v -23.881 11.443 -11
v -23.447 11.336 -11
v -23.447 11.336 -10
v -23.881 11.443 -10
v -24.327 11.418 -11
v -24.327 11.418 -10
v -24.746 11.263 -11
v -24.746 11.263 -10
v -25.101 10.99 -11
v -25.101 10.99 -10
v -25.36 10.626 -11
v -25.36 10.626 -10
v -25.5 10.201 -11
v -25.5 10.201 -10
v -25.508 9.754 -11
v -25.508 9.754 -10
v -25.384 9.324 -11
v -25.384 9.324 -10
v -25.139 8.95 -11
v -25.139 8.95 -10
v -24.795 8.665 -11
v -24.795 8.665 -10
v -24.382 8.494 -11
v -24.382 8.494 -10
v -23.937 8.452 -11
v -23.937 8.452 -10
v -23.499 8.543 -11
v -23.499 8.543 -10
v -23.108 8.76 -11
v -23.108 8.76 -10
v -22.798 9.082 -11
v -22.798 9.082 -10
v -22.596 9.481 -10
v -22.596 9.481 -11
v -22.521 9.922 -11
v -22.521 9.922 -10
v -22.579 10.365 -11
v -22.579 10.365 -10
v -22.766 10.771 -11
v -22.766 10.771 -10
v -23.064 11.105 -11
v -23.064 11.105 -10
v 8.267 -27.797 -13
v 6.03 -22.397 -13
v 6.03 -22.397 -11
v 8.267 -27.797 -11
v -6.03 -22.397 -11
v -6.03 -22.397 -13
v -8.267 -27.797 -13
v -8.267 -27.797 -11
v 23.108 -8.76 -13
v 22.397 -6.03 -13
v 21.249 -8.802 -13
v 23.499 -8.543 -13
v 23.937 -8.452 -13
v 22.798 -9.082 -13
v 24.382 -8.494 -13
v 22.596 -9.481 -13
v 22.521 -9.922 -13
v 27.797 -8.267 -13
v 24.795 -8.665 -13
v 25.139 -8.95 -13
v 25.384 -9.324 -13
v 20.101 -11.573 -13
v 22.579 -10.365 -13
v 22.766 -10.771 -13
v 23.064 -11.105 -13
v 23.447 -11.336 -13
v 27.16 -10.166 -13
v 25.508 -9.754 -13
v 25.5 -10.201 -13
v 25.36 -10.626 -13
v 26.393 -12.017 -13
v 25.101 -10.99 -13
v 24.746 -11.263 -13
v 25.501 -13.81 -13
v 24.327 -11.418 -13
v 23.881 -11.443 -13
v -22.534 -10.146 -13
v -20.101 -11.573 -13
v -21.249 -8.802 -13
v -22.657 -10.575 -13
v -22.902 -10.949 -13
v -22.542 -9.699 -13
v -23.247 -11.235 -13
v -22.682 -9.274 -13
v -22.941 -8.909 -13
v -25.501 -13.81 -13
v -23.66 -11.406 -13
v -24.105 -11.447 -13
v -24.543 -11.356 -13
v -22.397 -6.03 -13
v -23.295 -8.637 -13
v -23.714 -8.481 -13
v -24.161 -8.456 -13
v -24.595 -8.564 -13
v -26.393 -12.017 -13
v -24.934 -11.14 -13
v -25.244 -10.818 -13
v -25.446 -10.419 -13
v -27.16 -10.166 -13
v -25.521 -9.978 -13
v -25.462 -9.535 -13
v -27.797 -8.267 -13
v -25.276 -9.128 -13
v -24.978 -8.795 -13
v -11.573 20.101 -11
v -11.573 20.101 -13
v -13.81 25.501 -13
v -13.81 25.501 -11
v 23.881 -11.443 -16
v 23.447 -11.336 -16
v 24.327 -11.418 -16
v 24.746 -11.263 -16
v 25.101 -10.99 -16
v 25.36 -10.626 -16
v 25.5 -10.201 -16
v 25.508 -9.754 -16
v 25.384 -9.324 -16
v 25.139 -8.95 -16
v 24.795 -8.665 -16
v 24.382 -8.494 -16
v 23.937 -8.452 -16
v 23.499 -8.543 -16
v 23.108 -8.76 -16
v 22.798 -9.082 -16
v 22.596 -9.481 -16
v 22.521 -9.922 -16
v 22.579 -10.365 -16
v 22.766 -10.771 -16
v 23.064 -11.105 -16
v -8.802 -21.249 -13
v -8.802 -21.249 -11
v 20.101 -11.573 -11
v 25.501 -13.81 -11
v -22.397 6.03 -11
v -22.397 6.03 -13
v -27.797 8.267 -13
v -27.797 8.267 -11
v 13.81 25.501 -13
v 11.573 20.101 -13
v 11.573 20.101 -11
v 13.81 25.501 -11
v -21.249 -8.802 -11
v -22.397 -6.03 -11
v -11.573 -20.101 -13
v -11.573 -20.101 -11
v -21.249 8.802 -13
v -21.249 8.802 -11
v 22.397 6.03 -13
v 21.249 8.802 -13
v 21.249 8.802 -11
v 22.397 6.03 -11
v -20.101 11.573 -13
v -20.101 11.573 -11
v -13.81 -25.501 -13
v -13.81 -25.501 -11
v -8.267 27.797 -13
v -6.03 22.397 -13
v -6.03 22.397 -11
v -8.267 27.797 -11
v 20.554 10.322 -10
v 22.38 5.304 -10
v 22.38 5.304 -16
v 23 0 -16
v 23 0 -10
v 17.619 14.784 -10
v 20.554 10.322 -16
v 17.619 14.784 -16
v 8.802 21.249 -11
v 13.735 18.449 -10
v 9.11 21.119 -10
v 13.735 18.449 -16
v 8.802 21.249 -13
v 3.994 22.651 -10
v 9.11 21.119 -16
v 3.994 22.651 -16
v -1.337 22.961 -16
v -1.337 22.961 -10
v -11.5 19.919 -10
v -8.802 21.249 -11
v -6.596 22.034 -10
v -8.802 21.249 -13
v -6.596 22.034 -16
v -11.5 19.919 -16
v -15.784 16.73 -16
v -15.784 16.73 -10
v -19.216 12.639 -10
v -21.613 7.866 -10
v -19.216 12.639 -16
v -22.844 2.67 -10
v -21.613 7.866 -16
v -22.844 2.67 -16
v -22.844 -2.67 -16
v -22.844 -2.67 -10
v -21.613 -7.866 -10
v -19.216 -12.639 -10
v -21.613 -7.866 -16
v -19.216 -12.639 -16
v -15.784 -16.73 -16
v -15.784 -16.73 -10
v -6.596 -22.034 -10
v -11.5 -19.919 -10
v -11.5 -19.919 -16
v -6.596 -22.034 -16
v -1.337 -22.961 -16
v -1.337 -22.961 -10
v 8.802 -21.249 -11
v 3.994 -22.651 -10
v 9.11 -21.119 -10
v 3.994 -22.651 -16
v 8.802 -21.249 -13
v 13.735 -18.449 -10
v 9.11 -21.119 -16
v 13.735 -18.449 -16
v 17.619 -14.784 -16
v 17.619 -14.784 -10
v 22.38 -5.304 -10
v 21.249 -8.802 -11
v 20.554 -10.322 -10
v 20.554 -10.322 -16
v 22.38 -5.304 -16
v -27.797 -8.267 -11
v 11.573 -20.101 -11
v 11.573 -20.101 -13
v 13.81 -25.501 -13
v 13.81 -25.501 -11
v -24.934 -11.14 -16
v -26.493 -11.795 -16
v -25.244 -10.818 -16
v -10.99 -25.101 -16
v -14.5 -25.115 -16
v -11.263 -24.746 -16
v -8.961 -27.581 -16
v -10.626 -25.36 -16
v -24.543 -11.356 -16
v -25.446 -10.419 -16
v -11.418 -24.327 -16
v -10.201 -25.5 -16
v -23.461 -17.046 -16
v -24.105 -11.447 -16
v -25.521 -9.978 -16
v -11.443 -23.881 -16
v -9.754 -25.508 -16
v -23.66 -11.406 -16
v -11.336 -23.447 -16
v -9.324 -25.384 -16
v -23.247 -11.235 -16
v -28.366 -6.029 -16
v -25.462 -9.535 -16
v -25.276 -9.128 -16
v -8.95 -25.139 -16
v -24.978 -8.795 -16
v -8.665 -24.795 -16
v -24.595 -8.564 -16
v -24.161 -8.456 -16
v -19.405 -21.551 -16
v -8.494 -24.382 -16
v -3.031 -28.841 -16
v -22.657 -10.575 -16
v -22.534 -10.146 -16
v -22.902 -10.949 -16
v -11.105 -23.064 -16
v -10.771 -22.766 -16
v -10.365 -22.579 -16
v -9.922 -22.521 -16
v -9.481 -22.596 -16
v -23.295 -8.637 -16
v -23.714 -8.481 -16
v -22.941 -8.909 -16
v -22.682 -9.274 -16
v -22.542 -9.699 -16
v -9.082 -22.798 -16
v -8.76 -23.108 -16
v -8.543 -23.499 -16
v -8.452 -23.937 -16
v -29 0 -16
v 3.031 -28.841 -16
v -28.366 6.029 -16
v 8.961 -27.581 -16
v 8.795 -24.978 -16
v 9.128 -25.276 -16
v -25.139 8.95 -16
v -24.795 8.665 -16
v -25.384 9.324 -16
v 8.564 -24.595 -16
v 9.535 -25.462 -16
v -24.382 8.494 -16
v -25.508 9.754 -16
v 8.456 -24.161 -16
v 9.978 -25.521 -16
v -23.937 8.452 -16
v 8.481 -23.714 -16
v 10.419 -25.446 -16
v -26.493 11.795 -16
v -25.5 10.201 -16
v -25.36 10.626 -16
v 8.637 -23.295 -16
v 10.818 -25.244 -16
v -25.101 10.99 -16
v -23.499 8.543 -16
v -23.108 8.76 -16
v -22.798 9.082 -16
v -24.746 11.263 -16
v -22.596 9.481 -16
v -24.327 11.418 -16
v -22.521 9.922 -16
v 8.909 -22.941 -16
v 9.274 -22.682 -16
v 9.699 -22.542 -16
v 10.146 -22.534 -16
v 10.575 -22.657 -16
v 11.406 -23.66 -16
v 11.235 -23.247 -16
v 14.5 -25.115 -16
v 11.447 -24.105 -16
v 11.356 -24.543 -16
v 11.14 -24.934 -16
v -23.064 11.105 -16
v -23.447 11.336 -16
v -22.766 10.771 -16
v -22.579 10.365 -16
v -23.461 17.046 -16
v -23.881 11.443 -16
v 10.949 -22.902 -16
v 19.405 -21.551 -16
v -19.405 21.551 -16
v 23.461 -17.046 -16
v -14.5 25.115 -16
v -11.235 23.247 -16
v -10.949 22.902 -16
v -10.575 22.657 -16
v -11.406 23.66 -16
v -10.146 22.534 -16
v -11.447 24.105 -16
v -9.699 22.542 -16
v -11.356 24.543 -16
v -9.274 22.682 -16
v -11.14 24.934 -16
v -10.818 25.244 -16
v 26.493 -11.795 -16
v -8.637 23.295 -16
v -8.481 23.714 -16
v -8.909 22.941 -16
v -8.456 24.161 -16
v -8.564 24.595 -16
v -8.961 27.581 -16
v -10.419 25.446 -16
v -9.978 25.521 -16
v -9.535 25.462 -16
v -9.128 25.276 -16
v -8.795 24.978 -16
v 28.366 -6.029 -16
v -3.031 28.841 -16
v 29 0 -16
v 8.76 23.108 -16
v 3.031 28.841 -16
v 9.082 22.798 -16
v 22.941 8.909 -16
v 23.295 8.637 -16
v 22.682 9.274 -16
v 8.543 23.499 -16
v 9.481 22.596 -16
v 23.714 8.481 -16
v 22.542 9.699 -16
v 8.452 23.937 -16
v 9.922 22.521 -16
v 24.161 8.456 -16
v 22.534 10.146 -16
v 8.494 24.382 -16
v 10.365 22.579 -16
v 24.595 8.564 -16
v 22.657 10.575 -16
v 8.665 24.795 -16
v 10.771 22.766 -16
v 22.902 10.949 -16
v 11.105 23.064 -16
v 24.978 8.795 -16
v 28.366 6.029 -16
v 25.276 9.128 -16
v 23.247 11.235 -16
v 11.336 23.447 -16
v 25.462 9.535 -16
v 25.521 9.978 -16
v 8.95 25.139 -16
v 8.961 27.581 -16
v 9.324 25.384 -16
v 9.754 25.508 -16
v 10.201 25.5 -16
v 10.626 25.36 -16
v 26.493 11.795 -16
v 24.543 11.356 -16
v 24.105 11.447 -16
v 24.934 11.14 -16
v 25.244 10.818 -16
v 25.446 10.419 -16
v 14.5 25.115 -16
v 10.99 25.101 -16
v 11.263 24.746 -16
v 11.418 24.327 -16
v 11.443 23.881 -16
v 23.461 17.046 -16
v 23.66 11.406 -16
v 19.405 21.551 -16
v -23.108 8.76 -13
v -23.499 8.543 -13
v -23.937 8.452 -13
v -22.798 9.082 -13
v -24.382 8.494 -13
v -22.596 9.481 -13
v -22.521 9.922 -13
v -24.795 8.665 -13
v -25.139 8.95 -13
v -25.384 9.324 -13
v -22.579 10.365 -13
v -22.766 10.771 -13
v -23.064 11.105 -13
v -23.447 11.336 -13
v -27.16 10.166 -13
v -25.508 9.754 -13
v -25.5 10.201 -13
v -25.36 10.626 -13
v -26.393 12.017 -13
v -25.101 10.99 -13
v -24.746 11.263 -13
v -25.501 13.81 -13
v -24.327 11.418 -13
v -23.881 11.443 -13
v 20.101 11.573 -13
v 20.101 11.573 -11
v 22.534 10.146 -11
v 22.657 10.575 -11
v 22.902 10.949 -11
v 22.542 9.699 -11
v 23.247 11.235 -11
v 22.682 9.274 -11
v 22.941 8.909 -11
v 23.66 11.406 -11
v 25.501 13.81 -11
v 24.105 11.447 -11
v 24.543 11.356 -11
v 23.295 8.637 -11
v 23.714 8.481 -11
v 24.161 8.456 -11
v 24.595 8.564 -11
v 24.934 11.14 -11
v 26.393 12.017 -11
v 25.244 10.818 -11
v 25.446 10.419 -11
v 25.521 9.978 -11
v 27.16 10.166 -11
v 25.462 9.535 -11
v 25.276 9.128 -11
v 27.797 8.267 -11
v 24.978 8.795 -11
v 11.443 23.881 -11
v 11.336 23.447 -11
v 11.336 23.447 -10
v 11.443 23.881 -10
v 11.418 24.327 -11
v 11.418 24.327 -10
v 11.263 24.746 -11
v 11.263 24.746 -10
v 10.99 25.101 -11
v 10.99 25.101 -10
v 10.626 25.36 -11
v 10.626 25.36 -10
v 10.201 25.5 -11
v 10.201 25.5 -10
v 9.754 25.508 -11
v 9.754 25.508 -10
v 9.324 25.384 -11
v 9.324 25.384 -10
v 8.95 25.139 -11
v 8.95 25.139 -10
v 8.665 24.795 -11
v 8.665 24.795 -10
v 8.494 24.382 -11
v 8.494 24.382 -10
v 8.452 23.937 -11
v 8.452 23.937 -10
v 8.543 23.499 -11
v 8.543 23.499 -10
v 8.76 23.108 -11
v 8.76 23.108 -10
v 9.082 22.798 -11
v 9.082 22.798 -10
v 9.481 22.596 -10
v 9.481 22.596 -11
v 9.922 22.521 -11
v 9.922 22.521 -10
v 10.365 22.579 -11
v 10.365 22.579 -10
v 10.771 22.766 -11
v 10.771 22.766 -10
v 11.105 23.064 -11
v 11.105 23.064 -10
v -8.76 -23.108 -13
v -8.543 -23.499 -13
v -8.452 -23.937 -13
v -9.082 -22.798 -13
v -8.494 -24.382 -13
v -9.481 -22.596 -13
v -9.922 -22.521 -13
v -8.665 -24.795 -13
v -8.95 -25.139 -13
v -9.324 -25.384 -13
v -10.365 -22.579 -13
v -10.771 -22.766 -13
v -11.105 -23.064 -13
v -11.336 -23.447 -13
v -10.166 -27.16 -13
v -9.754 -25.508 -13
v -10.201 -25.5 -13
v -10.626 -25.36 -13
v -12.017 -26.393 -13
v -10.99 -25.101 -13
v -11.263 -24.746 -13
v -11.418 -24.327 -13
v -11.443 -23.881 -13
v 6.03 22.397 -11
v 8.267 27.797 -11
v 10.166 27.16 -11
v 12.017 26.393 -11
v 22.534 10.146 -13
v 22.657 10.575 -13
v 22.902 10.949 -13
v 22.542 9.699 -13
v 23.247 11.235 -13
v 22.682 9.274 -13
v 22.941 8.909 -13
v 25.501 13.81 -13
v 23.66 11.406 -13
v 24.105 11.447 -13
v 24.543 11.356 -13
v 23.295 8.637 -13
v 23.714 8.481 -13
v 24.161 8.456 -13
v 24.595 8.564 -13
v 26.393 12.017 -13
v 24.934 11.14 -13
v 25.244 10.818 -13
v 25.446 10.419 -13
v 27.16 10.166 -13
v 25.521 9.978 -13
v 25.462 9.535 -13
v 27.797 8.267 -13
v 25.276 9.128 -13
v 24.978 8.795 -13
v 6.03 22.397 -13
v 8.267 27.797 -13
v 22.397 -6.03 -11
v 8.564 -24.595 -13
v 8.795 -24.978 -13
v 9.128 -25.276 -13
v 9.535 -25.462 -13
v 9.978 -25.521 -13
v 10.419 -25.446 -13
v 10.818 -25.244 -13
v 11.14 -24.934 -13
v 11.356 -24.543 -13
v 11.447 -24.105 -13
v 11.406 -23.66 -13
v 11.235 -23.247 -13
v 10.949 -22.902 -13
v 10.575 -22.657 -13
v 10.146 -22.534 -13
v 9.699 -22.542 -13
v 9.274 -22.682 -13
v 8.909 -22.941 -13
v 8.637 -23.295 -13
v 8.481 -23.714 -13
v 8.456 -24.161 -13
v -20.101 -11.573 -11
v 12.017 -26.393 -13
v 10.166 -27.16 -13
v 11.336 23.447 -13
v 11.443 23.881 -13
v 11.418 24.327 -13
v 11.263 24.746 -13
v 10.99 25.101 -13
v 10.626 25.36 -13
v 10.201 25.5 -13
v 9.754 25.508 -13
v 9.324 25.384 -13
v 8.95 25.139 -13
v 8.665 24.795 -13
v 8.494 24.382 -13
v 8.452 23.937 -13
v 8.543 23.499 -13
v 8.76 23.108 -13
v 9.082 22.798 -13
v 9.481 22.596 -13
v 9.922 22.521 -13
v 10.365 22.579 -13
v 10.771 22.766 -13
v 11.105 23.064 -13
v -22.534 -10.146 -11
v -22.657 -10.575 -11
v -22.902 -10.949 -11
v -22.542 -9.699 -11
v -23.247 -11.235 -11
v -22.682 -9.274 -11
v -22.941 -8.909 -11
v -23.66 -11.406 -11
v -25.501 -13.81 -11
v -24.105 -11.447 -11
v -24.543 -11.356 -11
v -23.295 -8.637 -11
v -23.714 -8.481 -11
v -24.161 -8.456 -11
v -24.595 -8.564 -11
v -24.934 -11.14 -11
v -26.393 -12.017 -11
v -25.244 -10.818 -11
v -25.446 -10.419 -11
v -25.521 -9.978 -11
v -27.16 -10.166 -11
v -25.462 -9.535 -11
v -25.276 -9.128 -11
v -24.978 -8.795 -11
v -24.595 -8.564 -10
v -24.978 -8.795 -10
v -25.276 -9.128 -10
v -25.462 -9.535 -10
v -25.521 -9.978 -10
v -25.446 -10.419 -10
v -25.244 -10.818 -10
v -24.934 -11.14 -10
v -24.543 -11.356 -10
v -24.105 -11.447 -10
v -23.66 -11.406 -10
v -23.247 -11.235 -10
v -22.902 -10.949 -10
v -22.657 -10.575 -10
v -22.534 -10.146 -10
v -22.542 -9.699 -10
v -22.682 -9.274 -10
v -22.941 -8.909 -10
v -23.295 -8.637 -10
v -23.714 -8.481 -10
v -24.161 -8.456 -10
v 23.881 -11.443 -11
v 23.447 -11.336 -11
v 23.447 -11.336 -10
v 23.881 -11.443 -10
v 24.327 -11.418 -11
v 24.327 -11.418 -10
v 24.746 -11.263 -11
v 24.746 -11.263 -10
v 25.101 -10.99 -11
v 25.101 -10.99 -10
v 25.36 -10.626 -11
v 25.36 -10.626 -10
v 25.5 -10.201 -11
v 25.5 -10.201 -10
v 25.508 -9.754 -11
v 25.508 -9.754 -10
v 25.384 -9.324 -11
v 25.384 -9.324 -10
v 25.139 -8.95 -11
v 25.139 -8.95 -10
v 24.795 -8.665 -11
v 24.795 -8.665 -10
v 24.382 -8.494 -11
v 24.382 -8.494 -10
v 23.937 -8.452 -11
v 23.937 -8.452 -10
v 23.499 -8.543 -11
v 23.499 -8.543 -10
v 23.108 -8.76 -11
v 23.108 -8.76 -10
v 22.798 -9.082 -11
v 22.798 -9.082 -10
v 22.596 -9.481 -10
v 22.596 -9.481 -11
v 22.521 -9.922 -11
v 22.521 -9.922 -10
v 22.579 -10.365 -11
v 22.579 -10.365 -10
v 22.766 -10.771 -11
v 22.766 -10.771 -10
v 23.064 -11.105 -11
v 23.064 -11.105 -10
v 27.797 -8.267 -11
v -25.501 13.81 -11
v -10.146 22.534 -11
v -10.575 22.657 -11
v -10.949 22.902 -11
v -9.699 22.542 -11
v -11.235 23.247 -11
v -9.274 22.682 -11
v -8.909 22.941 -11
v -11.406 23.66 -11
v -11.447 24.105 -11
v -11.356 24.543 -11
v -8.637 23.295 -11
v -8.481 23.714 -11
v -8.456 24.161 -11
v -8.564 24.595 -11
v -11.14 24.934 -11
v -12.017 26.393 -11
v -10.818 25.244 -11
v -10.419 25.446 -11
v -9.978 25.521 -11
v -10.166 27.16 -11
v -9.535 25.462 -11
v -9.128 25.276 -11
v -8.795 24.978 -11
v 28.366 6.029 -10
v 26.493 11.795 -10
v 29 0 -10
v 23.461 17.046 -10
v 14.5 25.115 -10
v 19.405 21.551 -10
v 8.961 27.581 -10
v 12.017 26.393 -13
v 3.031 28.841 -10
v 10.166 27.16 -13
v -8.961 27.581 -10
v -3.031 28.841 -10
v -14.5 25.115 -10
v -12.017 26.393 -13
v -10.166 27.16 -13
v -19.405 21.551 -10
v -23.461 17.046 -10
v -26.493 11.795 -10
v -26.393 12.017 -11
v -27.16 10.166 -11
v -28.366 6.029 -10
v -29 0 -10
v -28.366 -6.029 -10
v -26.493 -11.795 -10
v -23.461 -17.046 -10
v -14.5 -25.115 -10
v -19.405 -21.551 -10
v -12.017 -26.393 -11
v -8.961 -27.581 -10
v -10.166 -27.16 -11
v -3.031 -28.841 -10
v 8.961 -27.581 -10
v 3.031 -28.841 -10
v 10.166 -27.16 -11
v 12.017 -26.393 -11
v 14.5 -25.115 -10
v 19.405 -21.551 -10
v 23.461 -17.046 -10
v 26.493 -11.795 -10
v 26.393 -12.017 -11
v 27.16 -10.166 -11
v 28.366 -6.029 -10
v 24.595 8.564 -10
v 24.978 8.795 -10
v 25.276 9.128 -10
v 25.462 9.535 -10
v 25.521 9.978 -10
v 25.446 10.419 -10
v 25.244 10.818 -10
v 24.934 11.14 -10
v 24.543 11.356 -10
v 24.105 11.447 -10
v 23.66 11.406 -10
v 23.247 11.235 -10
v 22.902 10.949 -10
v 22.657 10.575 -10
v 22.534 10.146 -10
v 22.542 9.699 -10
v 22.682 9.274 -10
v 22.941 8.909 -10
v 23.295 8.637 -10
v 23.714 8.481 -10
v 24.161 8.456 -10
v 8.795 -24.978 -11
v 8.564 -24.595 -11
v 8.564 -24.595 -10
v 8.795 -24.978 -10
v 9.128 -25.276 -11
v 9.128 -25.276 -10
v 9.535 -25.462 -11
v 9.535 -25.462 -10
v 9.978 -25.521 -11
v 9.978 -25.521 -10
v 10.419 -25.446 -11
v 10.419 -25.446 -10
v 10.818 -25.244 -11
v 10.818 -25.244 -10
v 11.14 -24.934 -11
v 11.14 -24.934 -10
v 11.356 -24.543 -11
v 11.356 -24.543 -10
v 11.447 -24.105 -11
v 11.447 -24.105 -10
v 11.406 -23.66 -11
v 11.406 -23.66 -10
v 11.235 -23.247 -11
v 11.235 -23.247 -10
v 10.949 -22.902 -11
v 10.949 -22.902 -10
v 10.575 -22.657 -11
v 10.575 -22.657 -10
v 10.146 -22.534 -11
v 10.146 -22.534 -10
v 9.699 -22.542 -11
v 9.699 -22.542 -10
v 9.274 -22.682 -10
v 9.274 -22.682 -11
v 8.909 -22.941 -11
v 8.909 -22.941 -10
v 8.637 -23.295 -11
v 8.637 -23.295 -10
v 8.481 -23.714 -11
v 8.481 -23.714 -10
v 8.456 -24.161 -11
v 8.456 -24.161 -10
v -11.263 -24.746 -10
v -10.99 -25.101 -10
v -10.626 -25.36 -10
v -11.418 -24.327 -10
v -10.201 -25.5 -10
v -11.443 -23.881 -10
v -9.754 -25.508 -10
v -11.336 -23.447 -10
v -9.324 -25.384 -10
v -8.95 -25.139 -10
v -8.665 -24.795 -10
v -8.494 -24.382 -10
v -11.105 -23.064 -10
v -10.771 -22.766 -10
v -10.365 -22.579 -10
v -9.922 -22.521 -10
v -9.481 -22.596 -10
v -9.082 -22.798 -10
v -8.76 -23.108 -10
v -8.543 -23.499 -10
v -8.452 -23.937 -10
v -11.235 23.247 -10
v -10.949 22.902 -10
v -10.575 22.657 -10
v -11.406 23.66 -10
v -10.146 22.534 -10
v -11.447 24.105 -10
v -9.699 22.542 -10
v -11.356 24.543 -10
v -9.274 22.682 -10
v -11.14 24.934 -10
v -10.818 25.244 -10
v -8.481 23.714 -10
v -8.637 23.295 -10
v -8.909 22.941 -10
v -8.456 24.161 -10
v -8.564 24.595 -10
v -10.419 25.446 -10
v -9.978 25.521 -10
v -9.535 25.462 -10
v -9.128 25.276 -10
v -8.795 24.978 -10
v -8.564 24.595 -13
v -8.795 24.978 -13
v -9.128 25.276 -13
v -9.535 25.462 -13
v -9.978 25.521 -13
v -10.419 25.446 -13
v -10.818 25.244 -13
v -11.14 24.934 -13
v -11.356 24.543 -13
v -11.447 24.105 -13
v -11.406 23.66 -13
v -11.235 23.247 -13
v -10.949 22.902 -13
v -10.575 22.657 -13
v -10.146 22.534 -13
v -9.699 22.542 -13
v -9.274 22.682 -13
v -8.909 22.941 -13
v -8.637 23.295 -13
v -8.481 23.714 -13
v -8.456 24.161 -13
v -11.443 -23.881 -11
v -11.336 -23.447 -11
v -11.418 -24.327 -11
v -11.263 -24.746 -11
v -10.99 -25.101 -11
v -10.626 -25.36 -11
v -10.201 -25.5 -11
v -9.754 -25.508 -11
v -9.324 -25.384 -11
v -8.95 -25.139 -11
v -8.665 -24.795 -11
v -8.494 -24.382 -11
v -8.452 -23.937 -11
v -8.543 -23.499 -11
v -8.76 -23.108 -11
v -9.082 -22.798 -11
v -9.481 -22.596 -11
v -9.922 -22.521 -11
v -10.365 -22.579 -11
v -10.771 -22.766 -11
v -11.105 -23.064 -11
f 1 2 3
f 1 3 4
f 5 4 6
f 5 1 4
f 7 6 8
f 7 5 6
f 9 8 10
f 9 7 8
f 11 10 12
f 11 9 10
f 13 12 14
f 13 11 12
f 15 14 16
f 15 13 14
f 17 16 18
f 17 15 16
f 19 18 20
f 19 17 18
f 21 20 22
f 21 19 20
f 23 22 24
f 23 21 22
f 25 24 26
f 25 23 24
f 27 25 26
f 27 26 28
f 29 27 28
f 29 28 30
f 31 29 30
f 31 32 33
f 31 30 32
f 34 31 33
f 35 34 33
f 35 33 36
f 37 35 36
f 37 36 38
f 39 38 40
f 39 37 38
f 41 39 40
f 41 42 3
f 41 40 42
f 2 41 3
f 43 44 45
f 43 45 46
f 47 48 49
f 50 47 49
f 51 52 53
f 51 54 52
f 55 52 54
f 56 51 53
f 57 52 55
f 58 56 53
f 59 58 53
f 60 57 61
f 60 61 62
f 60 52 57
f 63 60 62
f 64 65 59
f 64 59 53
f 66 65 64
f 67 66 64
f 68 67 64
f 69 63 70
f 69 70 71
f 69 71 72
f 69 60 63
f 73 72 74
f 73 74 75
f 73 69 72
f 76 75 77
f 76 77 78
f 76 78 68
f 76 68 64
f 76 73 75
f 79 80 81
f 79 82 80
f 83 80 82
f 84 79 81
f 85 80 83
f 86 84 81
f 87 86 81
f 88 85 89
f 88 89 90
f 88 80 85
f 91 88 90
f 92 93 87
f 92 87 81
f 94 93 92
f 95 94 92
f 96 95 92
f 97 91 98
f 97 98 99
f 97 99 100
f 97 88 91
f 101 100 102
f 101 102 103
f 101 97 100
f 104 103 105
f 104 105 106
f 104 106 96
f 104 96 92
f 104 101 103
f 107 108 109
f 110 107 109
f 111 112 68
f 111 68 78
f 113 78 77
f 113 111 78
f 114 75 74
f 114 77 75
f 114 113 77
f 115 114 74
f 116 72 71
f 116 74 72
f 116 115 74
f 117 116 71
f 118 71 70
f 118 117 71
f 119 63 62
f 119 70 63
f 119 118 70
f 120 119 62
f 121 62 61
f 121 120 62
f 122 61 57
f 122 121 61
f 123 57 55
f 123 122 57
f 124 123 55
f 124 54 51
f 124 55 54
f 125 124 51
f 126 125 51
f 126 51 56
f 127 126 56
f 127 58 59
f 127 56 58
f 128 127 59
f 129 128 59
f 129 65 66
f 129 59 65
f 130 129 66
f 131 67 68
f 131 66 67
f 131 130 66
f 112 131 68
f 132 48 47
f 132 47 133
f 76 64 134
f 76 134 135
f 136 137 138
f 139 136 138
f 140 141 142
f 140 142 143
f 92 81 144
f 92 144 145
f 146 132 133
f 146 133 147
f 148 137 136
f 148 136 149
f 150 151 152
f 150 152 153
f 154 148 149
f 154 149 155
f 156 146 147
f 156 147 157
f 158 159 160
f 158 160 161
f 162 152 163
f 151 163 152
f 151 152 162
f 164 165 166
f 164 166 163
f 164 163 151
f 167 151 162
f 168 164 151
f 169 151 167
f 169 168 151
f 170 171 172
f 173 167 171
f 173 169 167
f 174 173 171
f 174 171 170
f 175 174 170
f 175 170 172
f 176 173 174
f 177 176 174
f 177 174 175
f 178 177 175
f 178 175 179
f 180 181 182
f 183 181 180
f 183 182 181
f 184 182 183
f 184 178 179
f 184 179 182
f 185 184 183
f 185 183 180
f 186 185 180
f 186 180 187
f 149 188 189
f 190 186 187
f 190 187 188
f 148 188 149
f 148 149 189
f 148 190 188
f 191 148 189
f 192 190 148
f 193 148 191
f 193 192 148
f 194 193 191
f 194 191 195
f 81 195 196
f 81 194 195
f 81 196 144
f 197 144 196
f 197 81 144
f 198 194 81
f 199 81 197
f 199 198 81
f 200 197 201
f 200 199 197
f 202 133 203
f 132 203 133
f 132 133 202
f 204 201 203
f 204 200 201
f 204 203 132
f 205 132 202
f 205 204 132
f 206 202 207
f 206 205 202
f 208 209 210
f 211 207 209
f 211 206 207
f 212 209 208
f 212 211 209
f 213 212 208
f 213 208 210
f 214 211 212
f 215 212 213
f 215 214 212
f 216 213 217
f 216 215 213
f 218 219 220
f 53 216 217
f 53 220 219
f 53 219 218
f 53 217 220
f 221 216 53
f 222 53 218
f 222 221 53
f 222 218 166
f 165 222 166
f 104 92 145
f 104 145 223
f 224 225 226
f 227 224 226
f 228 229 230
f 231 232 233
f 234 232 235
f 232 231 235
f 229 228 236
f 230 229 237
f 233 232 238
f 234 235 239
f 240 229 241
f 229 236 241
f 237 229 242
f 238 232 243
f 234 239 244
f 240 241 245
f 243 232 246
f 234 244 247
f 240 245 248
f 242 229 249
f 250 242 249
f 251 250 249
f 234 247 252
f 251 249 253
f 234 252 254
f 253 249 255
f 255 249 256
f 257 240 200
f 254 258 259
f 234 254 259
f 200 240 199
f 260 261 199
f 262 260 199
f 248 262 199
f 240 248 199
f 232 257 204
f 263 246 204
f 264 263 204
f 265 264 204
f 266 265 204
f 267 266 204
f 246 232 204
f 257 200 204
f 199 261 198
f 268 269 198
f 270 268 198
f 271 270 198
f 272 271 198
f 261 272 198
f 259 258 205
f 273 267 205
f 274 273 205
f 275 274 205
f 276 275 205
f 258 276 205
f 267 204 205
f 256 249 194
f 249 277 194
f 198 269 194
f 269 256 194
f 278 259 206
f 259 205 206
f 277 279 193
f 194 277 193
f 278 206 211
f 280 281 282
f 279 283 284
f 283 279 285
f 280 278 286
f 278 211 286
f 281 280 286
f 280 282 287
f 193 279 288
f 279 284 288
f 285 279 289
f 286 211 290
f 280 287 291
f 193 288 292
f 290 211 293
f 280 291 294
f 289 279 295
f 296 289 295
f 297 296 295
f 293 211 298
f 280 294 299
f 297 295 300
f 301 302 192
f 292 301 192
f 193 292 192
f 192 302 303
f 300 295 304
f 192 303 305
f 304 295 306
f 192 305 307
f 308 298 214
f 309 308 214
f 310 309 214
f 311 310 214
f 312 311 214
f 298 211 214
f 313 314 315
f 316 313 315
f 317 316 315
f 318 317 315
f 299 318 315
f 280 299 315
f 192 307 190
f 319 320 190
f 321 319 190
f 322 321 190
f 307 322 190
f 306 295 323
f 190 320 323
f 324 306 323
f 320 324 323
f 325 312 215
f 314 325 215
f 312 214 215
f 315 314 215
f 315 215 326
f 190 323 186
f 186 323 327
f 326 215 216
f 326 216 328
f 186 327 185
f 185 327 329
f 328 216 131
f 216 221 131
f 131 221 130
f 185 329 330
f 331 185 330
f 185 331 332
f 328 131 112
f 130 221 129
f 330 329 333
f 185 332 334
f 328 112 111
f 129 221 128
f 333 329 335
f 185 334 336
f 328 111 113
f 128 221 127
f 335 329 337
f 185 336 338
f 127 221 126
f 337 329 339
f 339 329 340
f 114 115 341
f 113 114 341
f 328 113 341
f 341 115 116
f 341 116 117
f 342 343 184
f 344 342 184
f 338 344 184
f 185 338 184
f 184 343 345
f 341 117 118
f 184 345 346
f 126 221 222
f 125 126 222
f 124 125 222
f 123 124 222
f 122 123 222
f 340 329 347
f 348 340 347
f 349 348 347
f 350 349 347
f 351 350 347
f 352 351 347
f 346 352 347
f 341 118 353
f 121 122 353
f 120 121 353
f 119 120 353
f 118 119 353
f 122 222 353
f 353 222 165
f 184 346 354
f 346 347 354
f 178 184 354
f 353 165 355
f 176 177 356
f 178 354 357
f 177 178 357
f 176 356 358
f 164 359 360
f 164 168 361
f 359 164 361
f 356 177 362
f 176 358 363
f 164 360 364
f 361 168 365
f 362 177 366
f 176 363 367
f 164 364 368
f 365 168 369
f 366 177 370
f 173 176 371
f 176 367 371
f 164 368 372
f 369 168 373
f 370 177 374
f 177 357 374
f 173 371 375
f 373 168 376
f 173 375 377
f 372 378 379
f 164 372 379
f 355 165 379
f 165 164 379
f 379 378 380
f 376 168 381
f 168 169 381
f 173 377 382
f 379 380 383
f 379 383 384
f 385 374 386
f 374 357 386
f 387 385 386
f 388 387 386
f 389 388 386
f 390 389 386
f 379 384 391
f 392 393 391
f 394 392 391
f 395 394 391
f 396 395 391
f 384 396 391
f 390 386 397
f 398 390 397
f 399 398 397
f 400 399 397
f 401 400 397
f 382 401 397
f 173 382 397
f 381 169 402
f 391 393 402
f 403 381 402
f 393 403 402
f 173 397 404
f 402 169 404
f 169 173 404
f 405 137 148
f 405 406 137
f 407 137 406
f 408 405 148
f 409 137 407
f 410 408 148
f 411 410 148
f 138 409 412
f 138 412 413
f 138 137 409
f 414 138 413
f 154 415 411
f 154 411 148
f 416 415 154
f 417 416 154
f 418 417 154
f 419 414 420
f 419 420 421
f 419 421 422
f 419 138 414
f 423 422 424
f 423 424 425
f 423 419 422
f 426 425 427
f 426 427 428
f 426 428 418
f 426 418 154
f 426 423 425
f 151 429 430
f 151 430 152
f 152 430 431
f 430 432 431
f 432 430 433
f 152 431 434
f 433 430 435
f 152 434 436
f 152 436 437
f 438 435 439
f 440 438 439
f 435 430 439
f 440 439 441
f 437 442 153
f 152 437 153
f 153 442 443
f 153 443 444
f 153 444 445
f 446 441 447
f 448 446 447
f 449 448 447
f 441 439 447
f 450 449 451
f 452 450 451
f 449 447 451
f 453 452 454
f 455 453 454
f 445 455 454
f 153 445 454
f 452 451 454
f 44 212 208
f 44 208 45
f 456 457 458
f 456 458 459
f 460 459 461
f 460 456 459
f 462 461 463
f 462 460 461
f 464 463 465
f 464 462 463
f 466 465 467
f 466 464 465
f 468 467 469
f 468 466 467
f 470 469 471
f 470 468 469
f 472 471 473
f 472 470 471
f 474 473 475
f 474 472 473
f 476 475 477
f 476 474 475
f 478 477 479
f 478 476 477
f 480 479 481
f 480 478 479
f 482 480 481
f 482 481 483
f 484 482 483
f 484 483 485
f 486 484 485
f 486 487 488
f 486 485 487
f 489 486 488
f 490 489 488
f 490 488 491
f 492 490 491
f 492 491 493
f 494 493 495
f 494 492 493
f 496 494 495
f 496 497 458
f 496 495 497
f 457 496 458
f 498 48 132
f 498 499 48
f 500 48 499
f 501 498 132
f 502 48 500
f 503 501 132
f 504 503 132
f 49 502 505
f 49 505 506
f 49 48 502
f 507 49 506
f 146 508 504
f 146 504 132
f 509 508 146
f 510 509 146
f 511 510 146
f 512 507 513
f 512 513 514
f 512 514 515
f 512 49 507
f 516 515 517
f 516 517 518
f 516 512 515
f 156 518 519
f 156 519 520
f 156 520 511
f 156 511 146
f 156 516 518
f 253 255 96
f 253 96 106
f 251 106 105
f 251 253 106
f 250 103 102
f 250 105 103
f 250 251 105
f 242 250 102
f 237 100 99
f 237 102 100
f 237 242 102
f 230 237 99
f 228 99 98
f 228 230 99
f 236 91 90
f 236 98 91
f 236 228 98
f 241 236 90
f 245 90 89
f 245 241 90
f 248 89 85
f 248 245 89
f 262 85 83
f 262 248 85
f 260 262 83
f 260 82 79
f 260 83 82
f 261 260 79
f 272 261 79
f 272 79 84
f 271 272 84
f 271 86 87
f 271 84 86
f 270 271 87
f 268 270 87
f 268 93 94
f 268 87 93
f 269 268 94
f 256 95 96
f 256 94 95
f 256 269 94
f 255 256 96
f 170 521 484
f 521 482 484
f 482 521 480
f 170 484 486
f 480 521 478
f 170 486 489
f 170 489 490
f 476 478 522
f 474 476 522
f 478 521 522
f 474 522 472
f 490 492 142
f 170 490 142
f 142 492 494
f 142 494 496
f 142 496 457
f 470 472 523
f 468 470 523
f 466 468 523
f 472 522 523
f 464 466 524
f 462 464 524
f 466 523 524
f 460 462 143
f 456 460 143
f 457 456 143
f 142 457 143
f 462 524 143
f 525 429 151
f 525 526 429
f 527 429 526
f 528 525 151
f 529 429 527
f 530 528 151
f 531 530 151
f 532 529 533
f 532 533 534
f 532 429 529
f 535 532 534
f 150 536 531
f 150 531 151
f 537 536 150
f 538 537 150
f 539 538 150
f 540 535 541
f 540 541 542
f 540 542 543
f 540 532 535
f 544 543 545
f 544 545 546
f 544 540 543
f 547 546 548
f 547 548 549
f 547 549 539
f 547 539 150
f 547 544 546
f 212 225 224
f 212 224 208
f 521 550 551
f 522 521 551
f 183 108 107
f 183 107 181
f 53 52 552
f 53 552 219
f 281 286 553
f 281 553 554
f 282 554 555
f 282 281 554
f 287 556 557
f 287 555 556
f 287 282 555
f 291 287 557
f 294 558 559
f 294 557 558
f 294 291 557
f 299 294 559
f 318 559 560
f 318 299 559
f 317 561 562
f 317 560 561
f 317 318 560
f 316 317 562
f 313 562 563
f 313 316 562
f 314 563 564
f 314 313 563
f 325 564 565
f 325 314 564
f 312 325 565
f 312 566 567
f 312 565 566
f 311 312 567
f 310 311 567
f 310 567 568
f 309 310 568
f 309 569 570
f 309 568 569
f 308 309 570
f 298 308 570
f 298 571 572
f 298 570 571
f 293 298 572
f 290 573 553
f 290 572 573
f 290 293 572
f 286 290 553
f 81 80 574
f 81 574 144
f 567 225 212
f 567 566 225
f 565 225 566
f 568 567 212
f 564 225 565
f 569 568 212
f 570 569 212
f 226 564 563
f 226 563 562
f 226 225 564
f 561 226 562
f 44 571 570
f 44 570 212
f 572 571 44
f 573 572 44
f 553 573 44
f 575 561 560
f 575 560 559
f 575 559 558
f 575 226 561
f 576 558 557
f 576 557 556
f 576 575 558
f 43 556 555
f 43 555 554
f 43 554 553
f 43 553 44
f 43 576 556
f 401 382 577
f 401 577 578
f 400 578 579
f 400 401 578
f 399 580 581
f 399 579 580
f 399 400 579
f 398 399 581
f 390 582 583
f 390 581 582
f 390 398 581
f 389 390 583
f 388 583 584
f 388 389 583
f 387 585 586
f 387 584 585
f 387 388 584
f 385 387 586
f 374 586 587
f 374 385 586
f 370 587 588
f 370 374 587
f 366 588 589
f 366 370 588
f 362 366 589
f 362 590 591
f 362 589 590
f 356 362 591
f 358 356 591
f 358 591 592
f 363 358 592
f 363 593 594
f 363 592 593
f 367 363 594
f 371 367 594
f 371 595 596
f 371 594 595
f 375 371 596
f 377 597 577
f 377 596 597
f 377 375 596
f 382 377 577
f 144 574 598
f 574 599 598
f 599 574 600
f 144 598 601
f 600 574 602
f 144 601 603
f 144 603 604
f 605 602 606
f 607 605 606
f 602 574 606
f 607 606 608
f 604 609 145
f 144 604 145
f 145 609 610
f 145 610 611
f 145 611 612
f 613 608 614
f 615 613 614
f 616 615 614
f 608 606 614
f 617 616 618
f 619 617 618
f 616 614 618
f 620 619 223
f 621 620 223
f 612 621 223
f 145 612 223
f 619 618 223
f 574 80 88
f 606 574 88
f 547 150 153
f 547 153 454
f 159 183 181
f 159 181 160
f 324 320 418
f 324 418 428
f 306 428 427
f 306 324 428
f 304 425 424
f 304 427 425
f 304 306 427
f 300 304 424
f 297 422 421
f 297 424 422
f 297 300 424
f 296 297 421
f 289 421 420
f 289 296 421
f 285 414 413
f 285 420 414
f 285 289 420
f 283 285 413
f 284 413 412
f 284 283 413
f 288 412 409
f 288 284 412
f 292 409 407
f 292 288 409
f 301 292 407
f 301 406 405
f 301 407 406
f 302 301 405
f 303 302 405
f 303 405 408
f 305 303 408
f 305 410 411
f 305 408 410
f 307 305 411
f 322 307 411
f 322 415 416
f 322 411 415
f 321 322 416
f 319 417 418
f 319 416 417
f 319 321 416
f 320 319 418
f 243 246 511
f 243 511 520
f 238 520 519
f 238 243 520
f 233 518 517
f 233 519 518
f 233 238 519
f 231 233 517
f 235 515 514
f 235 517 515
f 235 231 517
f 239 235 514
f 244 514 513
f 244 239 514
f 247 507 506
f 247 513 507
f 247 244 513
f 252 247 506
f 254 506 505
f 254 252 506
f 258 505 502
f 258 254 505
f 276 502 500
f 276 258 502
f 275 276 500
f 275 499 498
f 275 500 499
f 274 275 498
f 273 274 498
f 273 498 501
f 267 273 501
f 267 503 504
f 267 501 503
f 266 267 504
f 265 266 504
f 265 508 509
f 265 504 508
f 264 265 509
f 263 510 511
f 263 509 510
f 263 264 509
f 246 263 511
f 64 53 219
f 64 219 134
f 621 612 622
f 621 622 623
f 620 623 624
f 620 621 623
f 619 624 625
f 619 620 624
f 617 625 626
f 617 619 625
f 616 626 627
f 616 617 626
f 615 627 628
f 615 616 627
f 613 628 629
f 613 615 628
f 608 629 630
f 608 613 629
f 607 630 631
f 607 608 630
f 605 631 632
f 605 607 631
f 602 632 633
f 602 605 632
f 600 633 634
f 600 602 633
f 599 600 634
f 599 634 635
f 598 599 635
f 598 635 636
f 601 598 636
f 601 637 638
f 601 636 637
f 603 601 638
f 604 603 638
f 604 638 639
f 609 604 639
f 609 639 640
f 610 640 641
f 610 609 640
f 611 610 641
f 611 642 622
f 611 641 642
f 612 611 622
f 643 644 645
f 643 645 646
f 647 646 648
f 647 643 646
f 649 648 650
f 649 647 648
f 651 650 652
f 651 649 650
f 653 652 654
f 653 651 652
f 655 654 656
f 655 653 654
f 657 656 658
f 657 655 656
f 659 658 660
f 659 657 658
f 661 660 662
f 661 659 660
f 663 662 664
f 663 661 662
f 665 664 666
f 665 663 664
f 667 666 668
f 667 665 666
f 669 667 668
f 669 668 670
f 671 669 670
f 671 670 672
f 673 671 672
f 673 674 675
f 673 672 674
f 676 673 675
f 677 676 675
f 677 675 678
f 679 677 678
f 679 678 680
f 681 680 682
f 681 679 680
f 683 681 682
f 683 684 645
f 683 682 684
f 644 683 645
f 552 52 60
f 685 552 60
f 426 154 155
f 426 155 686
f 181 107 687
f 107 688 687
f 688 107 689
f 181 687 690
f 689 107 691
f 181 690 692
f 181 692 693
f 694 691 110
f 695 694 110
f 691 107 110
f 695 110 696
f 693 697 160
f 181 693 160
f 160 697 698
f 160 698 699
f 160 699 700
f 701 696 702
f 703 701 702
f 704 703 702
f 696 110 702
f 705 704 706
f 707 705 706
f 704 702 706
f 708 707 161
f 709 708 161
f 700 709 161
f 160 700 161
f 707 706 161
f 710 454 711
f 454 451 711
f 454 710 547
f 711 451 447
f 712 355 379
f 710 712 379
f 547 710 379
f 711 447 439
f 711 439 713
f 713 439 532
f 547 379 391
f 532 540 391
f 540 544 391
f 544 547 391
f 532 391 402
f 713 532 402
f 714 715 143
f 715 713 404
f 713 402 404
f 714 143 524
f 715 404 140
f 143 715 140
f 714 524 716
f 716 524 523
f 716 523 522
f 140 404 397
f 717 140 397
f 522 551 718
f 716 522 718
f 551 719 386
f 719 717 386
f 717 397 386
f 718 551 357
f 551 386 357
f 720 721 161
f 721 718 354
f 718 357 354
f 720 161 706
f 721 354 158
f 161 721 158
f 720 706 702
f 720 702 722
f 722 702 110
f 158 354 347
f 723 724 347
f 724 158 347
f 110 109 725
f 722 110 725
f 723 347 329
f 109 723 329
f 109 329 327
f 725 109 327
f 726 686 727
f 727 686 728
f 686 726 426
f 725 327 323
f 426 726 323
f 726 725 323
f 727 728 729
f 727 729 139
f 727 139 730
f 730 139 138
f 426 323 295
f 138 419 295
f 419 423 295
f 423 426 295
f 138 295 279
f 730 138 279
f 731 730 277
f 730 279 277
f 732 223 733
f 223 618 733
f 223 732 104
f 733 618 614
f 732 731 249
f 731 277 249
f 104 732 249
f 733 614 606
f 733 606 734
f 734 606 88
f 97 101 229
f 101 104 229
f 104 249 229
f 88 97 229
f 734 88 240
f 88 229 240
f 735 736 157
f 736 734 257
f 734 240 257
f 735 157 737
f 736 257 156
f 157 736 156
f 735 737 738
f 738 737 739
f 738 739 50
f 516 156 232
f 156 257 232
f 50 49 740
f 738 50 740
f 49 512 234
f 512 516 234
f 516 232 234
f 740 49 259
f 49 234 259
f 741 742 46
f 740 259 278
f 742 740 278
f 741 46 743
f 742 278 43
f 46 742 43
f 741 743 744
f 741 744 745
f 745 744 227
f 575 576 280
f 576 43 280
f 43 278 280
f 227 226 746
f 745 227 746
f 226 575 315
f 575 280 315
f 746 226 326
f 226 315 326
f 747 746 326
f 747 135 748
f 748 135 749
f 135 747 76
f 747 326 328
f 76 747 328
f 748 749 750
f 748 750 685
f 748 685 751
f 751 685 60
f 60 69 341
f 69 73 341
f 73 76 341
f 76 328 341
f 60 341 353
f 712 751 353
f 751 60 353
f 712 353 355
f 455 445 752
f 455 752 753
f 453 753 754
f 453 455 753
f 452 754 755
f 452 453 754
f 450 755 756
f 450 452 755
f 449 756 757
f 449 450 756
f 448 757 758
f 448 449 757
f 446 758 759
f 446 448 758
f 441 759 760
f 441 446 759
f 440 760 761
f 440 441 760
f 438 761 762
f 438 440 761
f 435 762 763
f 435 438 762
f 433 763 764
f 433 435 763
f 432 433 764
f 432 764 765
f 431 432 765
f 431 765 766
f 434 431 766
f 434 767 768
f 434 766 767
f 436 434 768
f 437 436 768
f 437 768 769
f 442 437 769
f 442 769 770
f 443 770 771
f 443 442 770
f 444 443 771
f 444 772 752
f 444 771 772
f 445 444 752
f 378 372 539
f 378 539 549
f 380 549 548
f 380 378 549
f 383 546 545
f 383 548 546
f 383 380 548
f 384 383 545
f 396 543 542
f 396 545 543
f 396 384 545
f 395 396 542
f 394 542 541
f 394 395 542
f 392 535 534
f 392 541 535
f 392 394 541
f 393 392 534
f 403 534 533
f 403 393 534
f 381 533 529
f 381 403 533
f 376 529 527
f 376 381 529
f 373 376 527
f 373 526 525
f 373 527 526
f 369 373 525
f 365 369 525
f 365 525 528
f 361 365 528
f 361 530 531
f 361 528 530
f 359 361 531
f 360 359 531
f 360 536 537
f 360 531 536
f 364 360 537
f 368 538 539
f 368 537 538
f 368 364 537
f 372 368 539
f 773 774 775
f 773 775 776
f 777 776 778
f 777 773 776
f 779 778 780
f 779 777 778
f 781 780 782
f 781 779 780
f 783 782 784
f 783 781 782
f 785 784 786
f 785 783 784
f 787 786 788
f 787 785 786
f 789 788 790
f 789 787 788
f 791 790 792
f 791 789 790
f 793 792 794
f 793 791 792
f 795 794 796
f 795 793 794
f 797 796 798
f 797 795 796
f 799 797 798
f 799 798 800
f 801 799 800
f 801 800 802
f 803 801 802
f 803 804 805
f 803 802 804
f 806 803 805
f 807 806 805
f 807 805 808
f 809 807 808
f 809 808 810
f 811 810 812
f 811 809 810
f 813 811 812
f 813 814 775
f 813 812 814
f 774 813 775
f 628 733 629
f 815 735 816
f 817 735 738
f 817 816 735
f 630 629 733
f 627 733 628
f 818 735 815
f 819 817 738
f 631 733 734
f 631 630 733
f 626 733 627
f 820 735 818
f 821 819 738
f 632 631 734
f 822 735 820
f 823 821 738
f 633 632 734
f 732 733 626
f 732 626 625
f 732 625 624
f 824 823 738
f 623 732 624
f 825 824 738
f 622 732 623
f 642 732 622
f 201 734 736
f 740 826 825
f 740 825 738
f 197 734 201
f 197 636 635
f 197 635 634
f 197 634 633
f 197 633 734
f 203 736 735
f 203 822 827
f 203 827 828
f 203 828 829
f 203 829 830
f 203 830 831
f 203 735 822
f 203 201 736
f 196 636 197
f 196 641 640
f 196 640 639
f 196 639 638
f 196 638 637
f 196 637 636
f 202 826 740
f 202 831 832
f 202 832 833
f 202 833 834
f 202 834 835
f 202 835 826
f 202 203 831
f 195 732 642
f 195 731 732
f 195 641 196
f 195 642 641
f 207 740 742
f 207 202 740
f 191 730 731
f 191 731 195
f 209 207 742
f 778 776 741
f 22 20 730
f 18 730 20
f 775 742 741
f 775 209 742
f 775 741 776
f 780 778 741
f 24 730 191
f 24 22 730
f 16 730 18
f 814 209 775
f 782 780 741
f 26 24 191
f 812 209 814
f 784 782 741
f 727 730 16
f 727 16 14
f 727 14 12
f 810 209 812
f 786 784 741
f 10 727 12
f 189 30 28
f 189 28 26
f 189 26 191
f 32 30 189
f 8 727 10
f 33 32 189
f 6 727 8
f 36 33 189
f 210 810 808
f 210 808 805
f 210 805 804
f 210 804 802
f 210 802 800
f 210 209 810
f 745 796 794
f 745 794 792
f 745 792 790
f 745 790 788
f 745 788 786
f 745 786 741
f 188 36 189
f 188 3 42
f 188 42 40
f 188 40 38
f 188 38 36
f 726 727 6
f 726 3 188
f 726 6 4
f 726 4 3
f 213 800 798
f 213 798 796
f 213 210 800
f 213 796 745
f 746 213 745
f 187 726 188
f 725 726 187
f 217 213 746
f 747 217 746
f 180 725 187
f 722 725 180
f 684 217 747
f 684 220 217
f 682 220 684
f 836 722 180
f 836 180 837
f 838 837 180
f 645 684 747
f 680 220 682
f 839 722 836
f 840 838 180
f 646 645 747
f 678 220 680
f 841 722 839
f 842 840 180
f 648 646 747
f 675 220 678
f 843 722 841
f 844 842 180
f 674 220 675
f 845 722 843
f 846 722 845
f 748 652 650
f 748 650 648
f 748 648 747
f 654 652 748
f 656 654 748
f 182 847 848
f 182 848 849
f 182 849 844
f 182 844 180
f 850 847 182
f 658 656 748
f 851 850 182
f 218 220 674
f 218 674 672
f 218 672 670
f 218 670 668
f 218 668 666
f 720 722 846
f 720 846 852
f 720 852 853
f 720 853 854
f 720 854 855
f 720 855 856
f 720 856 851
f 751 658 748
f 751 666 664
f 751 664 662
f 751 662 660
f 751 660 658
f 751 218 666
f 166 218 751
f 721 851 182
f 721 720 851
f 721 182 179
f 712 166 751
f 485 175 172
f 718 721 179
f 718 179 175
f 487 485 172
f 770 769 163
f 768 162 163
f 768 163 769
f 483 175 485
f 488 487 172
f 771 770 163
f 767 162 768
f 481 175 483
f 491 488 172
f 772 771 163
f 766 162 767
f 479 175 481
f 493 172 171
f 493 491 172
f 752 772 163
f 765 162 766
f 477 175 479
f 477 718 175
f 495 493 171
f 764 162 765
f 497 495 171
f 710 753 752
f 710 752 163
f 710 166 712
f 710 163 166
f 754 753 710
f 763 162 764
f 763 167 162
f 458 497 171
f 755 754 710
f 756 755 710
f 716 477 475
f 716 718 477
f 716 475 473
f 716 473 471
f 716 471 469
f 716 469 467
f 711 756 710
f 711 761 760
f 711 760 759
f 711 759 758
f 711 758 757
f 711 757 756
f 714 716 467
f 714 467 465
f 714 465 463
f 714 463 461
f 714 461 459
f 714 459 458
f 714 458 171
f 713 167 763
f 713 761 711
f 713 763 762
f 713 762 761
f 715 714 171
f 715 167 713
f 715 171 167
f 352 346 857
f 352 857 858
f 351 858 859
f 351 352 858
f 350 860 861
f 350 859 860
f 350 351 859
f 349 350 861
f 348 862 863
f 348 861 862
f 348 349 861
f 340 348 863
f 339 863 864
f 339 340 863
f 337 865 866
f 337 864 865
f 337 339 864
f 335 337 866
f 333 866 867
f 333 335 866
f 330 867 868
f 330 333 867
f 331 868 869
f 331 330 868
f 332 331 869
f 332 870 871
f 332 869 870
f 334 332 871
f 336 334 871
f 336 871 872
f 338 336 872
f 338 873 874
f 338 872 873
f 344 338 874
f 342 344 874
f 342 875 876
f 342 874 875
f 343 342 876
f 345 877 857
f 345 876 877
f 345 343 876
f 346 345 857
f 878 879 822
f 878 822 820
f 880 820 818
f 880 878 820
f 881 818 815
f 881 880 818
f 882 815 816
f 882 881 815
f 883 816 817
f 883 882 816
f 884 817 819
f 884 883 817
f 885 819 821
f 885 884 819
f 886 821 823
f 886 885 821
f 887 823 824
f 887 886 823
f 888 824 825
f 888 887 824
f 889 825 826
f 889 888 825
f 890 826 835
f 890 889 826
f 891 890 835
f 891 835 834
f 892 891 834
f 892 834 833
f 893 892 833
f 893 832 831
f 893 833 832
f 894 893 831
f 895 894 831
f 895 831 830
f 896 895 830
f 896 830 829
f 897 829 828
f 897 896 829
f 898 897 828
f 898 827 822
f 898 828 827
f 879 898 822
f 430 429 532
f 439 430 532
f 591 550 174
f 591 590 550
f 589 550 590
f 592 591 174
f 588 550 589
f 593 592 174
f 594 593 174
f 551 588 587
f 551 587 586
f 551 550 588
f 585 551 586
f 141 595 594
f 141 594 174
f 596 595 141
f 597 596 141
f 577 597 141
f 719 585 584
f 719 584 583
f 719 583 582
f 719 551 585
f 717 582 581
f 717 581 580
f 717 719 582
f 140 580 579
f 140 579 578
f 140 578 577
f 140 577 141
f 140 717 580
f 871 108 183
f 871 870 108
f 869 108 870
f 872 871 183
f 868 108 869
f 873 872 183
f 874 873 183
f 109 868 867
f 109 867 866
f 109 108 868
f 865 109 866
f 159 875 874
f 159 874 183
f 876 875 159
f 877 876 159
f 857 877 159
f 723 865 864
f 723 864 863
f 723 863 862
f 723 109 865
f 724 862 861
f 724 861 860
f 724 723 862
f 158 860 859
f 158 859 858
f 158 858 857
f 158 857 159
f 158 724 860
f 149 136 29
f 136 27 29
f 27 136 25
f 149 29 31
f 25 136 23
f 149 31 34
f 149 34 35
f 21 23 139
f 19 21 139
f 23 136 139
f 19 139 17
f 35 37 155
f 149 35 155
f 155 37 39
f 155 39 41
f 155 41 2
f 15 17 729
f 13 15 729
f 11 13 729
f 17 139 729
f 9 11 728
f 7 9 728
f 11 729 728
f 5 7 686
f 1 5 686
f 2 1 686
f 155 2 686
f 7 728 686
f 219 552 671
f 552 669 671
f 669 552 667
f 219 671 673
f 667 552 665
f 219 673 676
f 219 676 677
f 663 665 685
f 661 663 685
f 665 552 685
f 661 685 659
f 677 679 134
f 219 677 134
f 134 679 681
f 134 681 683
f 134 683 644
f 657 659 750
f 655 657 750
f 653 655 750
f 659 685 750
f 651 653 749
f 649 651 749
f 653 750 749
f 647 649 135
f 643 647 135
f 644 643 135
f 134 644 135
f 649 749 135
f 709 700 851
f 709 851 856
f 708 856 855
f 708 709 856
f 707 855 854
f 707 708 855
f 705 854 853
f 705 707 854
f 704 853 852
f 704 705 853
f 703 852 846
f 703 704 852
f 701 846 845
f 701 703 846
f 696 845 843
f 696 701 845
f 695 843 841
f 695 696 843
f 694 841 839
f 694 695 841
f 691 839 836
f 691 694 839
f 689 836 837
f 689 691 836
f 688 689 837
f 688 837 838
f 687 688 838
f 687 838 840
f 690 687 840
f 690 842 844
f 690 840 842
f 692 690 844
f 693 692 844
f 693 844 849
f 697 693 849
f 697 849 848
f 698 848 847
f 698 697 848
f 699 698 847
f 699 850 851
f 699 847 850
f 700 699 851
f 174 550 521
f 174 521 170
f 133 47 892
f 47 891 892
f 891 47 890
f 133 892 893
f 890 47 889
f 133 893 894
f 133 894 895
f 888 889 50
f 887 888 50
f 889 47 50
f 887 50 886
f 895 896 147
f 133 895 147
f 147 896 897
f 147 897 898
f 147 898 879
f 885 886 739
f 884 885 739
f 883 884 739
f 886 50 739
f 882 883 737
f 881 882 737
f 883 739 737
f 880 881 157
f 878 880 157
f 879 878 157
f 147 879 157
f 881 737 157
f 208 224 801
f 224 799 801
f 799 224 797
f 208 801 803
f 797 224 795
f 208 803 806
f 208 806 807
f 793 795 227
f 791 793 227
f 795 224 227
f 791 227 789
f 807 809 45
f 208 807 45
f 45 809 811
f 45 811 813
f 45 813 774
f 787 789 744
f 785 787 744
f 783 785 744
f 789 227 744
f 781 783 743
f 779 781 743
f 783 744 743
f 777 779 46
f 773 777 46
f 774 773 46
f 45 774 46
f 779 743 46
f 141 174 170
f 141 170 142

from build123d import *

# Parameters (mm, degrees)
BOX049_W                    = 6
BOX049_H                    = 6
BOX049_DEPTH                = 2
BOX050_W                    = 6
BOX050_H                    = 6
BOX050_DEPTH                = 2
BOX050_PLACEMENT_ANGLE      = 135
BOX051_W                    = 6
BOX051_H                    = 6
BOX051_DEPTH                = 2
BOX052_W                    = 6
BOX052_H                    = 6
BOX052_DEPTH                = 2
BOX052_PLACEMENT_ANGLE      = 225
BOX053_W                    = 6
BOX053_H                    = 6
BOX053_DEPTH                = 2
BOX054_W                    = 6
BOX054_H                    = 6
BOX054_DEPTH                = 2
BOX054_PLACEMENT_ANGLE      = 45
BOX047_W                    = 6
BOX047_H                    = 6
BOX047_DEPTH                = 2
BOX048_W                    = 6
BOX048_H                    = 6
BOX048_DEPTH                = 2
BOX048_PLACEMENT_ANGLE      = 45
COMPOUND039_PLACEMENT_ANGLE = 22.5
CYLINDER112_R               = 1.5
CYLINDER112_DEPTH           = 15
CYLINDER112_PLACEMENT_ANGLE = 45
CYLINDER113_R               = 1.5
CYLINDER113_DEPTH           = 15
CYLINDER114_R               = 1.5
CYLINDER114_DEPTH           = 15
CYLINDER114_PLACEMENT_ANGLE = 135
CYLINDER115_R               = 1.5
CYLINDER115_DEPTH           = 15
CYLINDER116_R               = 1.5
CYLINDER116_DEPTH           = 15
CYLINDER116_PLACEMENT_ANGLE = 225
CYLINDER117_R               = 1.5
CYLINDER117_DEPTH           = 15
CYLINDER118_R               = 1.5
CYLINDER118_DEPTH           = 15
CYLINDER118_PLACEMENT_ANGLE = 45
CYLINDER111_R               = 1.5
CYLINDER111_DEPTH           = 15
COMPOUND897_PLACEMENT_ANGLE = 22.5
TUBE007_R                   = 29
TUBE007_R_2                 = 23
TUBE007_DEPTH               = 6


with BuildPart() as krychle049:
    # Box049 → Box049 (new body)
    with BuildSketch(Plane(origin=(-23, -3, -13), x_dir=(0, 1, 0), z_dir=(0, 0, 1))):
        with Locations((3, 3)):
            Rectangle(BOX049_W, BOX049_H)
    extrude(amount=BOX049_DEPTH)


with BuildPart() as krychle050:
    # Box050 → Box050 (new body)
    with BuildSketch(Plane.XY):
        with Locations((3, 3)):
            Rectangle(BOX050_W, BOX050_H)
    extrude(amount=BOX050_DEPTH)


with BuildPart() as krychle050_1:
    # Box050 placement: moved
    add(krychle050.part.moved(Location((-14.142136, -18.384776, -13))).rotate(Axis((-14.142136, -18.384776, -13), (0, 0, 1)), BOX050_PLACEMENT_ANGLE))


with BuildPart() as krychle051:
    # Box051 → Box051 (new body)
    with BuildSketch(Plane(origin=(3, -23, -13), x_dir=(-1, 0, 0), z_dir=(0, 0, 1))):
        with Locations((3, 3)):
            Rectangle(BOX051_W, BOX051_H)
    extrude(amount=BOX051_DEPTH)


with BuildPart() as krychle052:
    # Box052 → Box052 (new body)
    with BuildSketch(Plane.XY):
        with Locations((3, 3)):
            Rectangle(BOX052_W, BOX052_H)
    extrude(amount=BOX052_DEPTH)


with BuildPart() as krychle052_1:
    # Box052 placement: moved
    add(krychle052.part.moved(Location((18.384776, -14.142136, -13))).rotate(Axis((18.384776, -14.142136, -13), (0, 0, 1)), BOX052_PLACEMENT_ANGLE))


with BuildPart() as krychle053:
    # Box053 → Box053 (new body)
    with BuildSketch(Plane(origin=(23, 3, -13), x_dir=(0, -1, 0), z_dir=(0, 0, 1))):
        with Locations((3, 3)):
            Rectangle(BOX053_W, BOX053_H)
    extrude(amount=BOX053_DEPTH)


with BuildPart() as krychle054:
    # Box054 → Box054 (new body)
    with BuildSketch(Plane.XY):
        with Locations((3, 3)):
            Rectangle(BOX054_W, BOX054_H)
    extrude(amount=BOX054_DEPTH)


with BuildPart() as krychle054_1:
    # Box054 placement: moved
    add(krychle054.part.moved(Location((14.142136, 18.384776, -13))).rotate(Axis((14.142136, 18.384776, -13), (0, 0, -1)), BOX054_PLACEMENT_ANGLE))


with BuildPart() as krychle047:
    # Box047 → Box047 (new body)
    with BuildSketch(Plane(origin=(-3, 23, -13), x_dir=(1, 0, 0), z_dir=(0, 0, 1))):
        with Locations((3, 3)):
            Rectangle(BOX047_W, BOX047_H)
    extrude(amount=BOX047_DEPTH)


with BuildPart() as compound039:
    # Box048 → Box048 (new body)
    with BuildSketch(Plane.XY):
        with Locations((3, 3)):
            Rectangle(BOX048_W, BOX048_H)
    extrude(amount=BOX048_DEPTH)


with BuildPart() as compound039_1:
    # Box048 placement: moved
    add(compound039.part.moved(Location((-18.384776, 14.142136, -13))).rotate(Axis((-18.384776, 14.142136, -13), (0, 0, 1)), BOX048_PLACEMENT_ANGLE))

    # Compound039: union Krychle049, Krychle050, Krychle051, Krychle052, Krychle053, Krychle054, Krychle047
    add(krychle049.part)
    add(krychle050_1.part)
    add(krychle051.part)
    add(krychle052_1.part)
    add(krychle053.part)
    add(krychle054_1.part)
    add(krychle047.part)


with BuildPart() as compound039_2:
    # Compound039 placement: moved
    add(compound039_1.part.rotate(Axis((0, 0, 0), (0, 0, 1)), COMPOUND039_PLACEMENT_ANGLE))


with BuildPart() as v_lec112:
    # Cylinder112 → Cylinder112 (new body)
    with BuildSketch(Plane.XY):
        Circle(CYLINDER112_R)
    extrude(amount=CYLINDER112_DEPTH)


with BuildPart() as v_lec112_1:
    # Cylinder112 placement: moved
    add(v_lec112.part.moved(Location((-18.384776, 18.384776, -20))).rotate(Axis((-18.384776, 18.384776, -20), (0, 0, 1)), CYLINDER112_PLACEMENT_ANGLE))


with BuildPart() as v_lec113:
    # Cylinder113 → Cylinder113 (new body)
    with BuildSketch(Plane(origin=(-26, 0, -20), x_dir=(0, 1, 0), z_dir=(0, 0, 1))):
        Circle(CYLINDER113_R)
    extrude(amount=CYLINDER113_DEPTH)


with BuildPart() as v_lec114:
    # Cylinder114 → Cylinder114 (new body)
    with BuildSketch(Plane.XY):
        Circle(CYLINDER114_R)
    extrude(amount=CYLINDER114_DEPTH)


with BuildPart() as v_lec114_1:
    # Cylinder114 placement: moved
    add(v_lec114.part.moved(Location((-18.384776, -18.384776, -20))).rotate(Axis((-18.384776, -18.384776, -20), (0, 0, 1)), CYLINDER114_PLACEMENT_ANGLE))


with BuildPart() as v_lec115:
    # Cylinder115 → Cylinder115 (new body)
    with BuildSketch(Plane(origin=(0, -26, -20), x_dir=(-1, 0, 0), z_dir=(0, 0, 1))):
        Circle(CYLINDER115_R)
    extrude(amount=CYLINDER115_DEPTH)


with BuildPart() as v_lec116:
    # Cylinder116 → Cylinder116 (new body)
    with BuildSketch(Plane.XY):
        Circle(CYLINDER116_R)
    extrude(amount=CYLINDER116_DEPTH)


with BuildPart() as v_lec116_1:
    # Cylinder116 placement: moved
    add(v_lec116.part.moved(Location((18.384776, -18.384776, -20))).rotate(Axis((18.384776, -18.384776, -20), (0, 0, 1)), CYLINDER116_PLACEMENT_ANGLE))


with BuildPart() as v_lec117:
    # Cylinder117 → Cylinder117 (new body)
    with BuildSketch(Plane(origin=(26, 0, -20), x_dir=(0, -1, 0), z_dir=(0, 0, 1))):
        Circle(CYLINDER117_R)
    extrude(amount=CYLINDER117_DEPTH)


with BuildPart() as v_lec118:
    # Cylinder118 → Cylinder118 (new body)
    with BuildSketch(Plane.XY):
        Circle(CYLINDER118_R)
    extrude(amount=CYLINDER118_DEPTH)


with BuildPart() as v_lec118_1:
    # Cylinder118 placement: moved
    add(v_lec118.part.moved(Location((18.384776, 18.384776, -20))).rotate(Axis((18.384776, 18.384776, -20), (0, 0, -1)), CYLINDER118_PLACEMENT_ANGLE))


with BuildPart() as compound897:
    # Cylinder111 → Cylinder111 (new body)
    with BuildSketch(Plane(origin=(0, 26, -20), x_dir=(1, 0, 0), z_dir=(0, 0, 1))):
        Circle(CYLINDER111_R)
    extrude(amount=CYLINDER111_DEPTH)

    # Compound897: union Válec112, Válec113, Válec114, Válec115, Válec116, Válec117, Válec118
    add(v_lec112_1.part)
    add(v_lec113.part)
    add(v_lec114_1.part)
    add(v_lec115.part)
    add(v_lec116_1.part)
    add(v_lec117.part)
    add(v_lec118_1.part)


with BuildPart() as compound897_1:
    # Compound897 placement: moved
    add(compound897.part.rotate(Axis((0, 0, 0), (0, 0, 1)), COMPOUND897_PLACEMENT_ANGLE))


with BuildPart() as cut311:
    # Tube007 → Tube007 (new body)
    with BuildSketch(Plane.XY.offset(-16)):
        Circle(TUBE007_R)
        Circle(TUBE007_R_2, mode=Mode.SUBTRACT)
    extrude(amount=TUBE007_DEPTH)

    # Cut532: cut Compound897
    add(compound897_1.part, mode=Mode.SUBTRACT)

    # Cut311: cut Compound039
    add(compound039_2.part, mode=Mode.SUBTRACT)


solid = cut311.part
